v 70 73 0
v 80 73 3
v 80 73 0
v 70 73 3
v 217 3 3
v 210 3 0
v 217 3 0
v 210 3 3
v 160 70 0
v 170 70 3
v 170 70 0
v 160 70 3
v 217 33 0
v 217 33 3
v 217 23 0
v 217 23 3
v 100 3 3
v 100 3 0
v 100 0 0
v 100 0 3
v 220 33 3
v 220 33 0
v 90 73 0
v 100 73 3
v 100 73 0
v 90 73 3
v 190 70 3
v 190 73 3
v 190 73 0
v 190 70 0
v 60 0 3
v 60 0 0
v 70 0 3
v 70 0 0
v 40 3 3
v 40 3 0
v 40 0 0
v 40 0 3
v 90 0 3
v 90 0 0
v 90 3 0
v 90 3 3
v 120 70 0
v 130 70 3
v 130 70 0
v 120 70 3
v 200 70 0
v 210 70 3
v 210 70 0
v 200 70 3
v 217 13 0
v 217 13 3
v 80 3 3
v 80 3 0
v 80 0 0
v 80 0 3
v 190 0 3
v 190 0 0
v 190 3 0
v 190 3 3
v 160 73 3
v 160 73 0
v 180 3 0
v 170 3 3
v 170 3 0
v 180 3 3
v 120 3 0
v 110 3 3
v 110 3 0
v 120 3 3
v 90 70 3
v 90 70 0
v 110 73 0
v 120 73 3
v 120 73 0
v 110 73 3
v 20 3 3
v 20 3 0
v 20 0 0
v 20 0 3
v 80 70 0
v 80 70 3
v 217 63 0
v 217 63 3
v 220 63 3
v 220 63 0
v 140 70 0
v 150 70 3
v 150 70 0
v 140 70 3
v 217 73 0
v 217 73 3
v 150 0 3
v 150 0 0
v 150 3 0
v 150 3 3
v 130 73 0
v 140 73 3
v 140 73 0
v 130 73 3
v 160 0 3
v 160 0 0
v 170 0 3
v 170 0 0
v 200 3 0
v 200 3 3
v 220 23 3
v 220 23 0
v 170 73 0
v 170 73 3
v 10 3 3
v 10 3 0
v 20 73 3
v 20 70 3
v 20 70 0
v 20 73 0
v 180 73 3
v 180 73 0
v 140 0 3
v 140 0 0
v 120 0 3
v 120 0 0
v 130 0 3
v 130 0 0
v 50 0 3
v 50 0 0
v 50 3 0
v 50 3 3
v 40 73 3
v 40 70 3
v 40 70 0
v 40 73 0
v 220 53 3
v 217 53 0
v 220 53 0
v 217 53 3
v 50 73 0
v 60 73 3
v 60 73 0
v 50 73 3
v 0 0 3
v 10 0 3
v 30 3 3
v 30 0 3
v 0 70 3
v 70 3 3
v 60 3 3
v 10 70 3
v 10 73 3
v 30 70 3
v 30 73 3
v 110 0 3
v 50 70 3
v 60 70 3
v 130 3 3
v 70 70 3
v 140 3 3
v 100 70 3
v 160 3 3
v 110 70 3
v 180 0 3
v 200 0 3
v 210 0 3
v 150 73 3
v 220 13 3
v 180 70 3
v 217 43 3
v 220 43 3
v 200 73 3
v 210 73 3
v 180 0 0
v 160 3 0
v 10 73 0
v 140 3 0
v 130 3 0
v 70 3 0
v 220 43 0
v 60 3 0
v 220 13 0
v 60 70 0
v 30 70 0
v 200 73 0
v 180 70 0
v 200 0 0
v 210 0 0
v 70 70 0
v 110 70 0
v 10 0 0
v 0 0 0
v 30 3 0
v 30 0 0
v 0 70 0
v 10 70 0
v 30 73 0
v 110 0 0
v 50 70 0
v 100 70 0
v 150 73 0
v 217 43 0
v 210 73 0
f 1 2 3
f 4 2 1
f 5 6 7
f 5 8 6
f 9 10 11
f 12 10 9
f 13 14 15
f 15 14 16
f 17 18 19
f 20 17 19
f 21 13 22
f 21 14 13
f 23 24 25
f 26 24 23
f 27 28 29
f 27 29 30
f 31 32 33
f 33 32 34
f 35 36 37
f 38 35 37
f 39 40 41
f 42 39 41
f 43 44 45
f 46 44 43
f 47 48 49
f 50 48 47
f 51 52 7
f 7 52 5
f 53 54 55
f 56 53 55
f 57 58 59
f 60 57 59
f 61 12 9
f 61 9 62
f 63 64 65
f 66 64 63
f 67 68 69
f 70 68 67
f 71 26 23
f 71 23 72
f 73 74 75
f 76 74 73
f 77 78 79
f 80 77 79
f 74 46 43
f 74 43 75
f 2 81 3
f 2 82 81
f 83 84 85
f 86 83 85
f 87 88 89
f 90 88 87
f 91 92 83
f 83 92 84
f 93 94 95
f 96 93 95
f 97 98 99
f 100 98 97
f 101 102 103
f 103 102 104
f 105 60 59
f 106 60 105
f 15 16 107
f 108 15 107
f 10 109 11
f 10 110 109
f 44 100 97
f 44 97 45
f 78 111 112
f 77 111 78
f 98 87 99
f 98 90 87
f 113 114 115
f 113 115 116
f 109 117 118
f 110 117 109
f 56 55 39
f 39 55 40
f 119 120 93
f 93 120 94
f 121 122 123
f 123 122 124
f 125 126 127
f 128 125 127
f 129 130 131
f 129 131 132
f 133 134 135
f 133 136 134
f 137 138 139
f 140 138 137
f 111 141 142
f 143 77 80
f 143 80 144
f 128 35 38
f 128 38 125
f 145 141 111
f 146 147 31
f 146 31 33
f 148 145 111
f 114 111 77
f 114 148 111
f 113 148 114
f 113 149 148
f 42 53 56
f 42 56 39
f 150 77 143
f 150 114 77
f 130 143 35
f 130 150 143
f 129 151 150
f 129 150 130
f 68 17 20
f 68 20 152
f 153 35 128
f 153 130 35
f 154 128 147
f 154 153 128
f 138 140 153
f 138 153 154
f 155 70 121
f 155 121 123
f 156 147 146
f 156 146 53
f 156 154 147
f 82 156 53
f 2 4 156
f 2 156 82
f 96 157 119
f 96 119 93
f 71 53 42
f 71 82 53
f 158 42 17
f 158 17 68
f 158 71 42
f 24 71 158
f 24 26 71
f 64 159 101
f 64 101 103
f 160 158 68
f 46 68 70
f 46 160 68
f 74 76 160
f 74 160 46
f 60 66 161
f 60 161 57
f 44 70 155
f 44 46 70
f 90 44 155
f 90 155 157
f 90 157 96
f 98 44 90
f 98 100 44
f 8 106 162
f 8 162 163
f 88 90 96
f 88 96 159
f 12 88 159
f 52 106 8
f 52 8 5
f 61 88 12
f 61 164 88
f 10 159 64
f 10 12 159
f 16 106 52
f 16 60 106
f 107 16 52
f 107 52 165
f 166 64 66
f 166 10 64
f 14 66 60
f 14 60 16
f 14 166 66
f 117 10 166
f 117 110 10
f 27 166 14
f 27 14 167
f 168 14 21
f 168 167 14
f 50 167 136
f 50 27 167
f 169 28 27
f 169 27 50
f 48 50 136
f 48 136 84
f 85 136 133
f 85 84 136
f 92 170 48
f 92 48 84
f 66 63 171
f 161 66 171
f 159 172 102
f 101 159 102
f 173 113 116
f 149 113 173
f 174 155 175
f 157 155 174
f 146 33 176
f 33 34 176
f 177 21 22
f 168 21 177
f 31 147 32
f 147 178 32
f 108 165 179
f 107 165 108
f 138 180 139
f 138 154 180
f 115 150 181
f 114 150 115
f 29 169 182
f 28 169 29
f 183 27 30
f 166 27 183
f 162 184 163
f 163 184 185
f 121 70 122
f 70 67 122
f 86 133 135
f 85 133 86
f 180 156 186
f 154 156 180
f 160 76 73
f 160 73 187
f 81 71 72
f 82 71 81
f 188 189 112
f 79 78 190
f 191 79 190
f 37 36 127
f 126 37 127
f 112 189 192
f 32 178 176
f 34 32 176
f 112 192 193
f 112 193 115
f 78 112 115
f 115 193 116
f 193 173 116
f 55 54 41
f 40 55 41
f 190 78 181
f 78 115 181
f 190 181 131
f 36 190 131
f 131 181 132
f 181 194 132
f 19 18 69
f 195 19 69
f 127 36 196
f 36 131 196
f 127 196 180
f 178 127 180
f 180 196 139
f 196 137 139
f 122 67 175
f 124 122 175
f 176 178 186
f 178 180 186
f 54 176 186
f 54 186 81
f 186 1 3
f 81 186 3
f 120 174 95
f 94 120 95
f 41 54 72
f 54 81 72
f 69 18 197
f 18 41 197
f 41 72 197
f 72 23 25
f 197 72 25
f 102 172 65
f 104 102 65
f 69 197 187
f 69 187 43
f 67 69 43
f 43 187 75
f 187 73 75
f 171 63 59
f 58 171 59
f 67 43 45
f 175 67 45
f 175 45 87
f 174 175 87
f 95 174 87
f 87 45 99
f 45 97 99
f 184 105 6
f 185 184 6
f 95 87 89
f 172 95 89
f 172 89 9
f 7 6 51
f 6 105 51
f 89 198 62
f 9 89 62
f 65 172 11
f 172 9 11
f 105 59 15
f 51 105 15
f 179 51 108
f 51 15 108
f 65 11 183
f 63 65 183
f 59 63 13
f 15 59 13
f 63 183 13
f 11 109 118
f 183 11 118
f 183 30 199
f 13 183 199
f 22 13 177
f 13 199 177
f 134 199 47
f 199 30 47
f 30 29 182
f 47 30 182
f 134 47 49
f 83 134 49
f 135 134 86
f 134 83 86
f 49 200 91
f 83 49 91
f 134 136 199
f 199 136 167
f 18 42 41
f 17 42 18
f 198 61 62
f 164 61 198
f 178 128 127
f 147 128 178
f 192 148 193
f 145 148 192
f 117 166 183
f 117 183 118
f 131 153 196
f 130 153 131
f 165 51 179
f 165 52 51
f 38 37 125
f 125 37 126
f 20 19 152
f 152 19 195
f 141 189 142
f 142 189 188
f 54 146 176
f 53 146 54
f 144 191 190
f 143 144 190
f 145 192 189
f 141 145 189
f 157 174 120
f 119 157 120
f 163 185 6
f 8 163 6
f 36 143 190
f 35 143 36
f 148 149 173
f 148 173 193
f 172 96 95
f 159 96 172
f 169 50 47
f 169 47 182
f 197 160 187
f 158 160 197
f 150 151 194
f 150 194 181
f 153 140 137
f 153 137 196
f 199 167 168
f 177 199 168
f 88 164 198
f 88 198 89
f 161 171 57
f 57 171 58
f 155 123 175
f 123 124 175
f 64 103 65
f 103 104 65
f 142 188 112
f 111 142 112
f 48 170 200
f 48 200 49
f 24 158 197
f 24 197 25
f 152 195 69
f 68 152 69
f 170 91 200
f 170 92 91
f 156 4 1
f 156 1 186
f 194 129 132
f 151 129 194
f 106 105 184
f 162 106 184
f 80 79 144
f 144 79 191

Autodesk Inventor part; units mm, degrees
ref_plane "YZ Plane" through (0, 0, 0) normal (1, 0, 0) x (0, 1, 0)
ref_plane "XZ Plane" through (0, 0, 0) normal (0, 1, 0) x (-1, 0, 0)
ref_plane "XY Plane" through (0, 0, 0) normal (0, 0, 1) x (1, 0, 0)
sketch "Эскиз1" plane through (0, 0, 0) normal (0, 0, 1) x (1, 0, 0)
  line L0 (0, 0) -> (10, 0)
  line L1 (10, 0) -> (10, 3)
  line L2 (10, 3) -> (0, 3)
  line L3 (0, 3) -> (0, 0)
  dimension "d0" = 10
  dimension "d1" = 3
extrude "Выдавливание1" add sketch "Эскиз1" along normal blind 3
pattern_linear "Прямоуг.массив1" count 11 spacing 20 along (1, 0, 0) of "Выдавливание1"
sketch "Эскиз2" plane through (0, 0, 3) normal (0, 0, 1) x (1, 0, 0)
  line L0 (0, 3) -> (0, 0) projected
  line L1 (0, 3) -> (220, 3)
  line L2 (220, 3) -> (220, 73)
  line L3 (220, 73) -> (0, 73)
  line L4 (0, 73) -> (0, 3)
  line L5 (210, 0) -> (210, 3) projected
  dimension "d8" = 70
  dimension "d11" = 10
extrude "Выдавливание2" add sketch "Эскиз2" against normal blind 3
sketch "Эскиз3" plane through (0, 0, 3) normal (0, 0, 1) x (1, 0, 0)
  line L0 (0, 73) -> (220, 73) projected
  line L1 (220, 73) -> (217, 73)
  line L2 (217, 73) -> (217, 63)
  line L3 (217, 63) -> (220, 63)
  line L4 (220, 63) -> (220, 73)
  point P0 (0, 0)
  dimension "d12" = 3
  dimension "d13" = 10
extrude "Выдавливание3" cut sketch "Эскиз3" against normal blind 10
pattern_linear "Прямоуг.массив2" count 4 spacing 20 along (0, -1, 0) of "Выдавливание3"
sketch "Эскиз4" plane through (0, 0, 3) normal (0, 0, 1) x (1, 0, 0)
  line L0 (0, 73) -> (217, 73) projected
  line L1 (0, 73) -> (10, 73)
  line L2 (10, 73) -> (10, 70)
  line L3 (10, 70) -> (0, 70)
  line L4 (0, 70) -> (0, 73)
  point P0 (0, 0)
  dimension "d19" = 10
  dimension "d20" = 3
extrude "Выдавливание4" cut sketch "Эскиз4" against normal blind 10
pattern_linear "Прямоуг.массив3" count 11 spacing 20 along (1, 0, 0) of "Выдавливание4"
properties part number "000.102 - Left wall"
